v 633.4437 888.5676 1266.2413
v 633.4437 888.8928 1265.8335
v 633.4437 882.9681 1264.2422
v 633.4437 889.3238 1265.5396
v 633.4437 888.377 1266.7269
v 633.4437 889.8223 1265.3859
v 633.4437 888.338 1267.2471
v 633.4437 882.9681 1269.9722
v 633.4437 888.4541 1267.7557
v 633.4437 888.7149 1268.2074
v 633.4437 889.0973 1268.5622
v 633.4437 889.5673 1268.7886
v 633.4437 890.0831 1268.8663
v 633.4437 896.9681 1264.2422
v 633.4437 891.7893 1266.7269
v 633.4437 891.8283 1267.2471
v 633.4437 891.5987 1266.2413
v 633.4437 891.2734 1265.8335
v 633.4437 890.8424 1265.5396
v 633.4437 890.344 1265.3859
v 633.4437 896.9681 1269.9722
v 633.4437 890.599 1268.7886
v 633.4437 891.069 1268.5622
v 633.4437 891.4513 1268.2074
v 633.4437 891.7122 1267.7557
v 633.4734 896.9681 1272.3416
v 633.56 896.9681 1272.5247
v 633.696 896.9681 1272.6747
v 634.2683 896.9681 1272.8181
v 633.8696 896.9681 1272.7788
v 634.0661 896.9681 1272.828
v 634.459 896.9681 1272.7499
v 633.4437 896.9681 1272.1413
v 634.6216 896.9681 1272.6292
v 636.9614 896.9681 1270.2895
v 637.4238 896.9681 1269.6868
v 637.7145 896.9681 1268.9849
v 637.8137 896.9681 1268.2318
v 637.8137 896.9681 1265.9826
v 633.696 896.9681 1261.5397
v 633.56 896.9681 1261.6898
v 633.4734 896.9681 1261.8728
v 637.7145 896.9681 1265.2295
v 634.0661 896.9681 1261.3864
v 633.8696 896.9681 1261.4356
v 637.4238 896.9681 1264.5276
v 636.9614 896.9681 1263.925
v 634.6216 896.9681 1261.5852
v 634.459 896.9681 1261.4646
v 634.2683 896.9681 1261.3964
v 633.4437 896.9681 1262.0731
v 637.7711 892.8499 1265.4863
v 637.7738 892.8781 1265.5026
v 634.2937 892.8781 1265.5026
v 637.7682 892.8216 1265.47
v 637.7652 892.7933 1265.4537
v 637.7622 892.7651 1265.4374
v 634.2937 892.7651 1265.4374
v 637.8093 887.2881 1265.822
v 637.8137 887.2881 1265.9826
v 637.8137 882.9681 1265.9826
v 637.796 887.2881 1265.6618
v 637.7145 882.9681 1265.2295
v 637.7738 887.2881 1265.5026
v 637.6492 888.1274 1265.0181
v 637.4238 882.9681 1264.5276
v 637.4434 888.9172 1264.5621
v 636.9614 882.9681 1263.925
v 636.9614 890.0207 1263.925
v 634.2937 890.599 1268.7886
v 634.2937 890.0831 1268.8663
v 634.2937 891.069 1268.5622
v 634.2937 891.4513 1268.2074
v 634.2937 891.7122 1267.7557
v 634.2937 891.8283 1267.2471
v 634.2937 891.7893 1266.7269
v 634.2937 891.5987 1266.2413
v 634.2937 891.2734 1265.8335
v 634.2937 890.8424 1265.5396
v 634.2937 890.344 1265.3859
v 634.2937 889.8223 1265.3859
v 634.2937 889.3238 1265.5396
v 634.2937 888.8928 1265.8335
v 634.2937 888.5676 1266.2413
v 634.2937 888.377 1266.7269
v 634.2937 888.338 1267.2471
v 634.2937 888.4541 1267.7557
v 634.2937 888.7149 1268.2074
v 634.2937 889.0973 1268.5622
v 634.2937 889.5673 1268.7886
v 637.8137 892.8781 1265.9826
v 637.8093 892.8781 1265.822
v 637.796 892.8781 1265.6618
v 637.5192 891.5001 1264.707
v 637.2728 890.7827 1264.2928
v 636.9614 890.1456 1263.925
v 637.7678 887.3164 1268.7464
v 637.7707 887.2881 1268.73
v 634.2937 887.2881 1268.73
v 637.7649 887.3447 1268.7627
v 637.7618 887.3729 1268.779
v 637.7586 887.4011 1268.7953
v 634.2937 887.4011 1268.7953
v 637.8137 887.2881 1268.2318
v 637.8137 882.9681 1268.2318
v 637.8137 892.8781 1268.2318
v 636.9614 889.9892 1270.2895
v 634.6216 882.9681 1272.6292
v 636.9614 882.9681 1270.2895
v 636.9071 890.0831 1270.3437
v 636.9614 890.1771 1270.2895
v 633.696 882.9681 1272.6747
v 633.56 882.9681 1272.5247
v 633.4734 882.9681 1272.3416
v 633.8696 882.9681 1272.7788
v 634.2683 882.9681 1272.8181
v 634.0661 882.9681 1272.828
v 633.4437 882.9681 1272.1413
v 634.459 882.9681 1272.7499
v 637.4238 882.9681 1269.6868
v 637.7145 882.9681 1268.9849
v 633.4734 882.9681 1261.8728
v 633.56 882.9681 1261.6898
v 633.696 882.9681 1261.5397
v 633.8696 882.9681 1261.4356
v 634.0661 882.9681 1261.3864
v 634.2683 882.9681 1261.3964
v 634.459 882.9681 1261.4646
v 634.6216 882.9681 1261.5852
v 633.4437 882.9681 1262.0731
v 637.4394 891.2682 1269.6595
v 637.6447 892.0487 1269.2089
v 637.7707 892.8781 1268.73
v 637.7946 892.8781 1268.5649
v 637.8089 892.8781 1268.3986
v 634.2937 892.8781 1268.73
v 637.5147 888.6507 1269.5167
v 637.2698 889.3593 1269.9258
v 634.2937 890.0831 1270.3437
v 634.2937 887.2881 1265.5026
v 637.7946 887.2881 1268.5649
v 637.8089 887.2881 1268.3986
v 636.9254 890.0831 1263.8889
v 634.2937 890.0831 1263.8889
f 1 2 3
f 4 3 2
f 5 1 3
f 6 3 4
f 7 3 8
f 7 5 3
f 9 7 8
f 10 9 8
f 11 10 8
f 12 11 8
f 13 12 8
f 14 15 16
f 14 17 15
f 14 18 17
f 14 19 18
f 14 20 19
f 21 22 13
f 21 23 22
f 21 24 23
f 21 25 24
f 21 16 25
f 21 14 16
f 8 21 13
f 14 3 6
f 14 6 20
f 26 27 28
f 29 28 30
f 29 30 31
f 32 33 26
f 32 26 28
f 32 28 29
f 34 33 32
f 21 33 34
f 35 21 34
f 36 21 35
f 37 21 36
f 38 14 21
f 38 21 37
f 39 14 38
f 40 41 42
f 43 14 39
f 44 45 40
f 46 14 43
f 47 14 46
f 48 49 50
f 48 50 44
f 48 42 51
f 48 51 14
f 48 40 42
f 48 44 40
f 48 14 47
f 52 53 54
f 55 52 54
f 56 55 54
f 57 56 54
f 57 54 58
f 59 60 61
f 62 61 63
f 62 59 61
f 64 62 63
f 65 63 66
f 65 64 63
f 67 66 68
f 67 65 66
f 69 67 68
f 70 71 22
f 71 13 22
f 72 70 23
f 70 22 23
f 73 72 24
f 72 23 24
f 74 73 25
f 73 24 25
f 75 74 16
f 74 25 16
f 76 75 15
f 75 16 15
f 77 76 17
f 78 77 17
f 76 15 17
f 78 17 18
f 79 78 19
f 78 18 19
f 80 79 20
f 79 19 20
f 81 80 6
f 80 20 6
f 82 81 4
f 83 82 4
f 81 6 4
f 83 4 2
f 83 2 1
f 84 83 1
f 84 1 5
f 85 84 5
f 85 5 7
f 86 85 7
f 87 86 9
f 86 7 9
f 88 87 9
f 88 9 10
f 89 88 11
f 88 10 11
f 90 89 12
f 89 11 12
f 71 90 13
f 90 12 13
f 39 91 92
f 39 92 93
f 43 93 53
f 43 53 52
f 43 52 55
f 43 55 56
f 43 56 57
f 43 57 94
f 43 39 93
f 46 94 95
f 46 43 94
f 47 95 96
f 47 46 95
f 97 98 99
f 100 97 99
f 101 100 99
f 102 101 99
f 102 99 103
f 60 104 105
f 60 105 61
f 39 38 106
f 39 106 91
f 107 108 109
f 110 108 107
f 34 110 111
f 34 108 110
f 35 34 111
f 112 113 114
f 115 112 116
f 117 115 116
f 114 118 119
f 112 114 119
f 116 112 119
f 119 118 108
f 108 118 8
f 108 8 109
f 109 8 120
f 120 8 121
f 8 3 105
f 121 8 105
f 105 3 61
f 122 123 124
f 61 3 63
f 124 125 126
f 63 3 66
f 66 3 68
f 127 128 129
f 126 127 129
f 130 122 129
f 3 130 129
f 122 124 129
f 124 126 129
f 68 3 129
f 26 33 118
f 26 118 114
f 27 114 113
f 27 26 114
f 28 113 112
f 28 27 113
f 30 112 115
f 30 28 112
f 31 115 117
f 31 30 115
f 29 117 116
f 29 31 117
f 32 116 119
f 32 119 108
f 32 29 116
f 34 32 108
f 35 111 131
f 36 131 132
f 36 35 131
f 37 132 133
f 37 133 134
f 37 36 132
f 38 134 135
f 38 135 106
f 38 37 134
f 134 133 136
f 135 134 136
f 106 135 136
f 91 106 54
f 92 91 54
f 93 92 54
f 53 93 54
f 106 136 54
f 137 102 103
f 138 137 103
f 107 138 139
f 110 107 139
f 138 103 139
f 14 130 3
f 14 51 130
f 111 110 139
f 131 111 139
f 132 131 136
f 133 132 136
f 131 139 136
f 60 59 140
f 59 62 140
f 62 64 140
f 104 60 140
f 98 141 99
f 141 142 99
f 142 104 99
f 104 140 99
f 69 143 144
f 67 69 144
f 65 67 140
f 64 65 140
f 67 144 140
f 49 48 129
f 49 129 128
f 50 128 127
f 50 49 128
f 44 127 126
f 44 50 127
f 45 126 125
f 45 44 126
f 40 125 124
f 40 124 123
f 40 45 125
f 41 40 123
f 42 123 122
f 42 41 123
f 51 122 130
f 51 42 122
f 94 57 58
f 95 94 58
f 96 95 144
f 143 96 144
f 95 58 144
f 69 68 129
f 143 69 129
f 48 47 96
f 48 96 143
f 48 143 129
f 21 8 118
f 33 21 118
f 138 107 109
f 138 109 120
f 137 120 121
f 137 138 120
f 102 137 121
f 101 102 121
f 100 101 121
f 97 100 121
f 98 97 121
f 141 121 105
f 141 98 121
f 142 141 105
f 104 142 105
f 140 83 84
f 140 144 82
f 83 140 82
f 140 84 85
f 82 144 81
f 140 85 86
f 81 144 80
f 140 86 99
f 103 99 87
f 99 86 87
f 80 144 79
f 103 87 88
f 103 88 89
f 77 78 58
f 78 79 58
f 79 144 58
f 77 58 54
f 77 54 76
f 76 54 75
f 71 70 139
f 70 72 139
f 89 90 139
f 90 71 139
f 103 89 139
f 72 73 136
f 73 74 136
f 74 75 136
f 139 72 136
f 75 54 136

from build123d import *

# Parameters (mm, degrees)
BOSS_EXTRUDE1_START = 2.6
BOSS_EXTRUDE1_DEPTH = 7
CUT_EXTRUDE1_START  = -0.8
CUT_EXTRUDE1_DEPTH  = 10
SKETCH3_R           = 1.75
CUT_EXTRUDE2_DEPTH  = 5


with BuildPart() as part:
    # Sketch1 → Boss-Extrude1 (new, symmetric)
    with BuildSketch(Plane(origin=(0, 887.368143731, 0), x_dir=(1, 0, 0), z_dir=(0, 1, 0)).offset(BOSS_EXTRUDE1_START)):
        with BuildLine():
            Line((633.443700104, -1269.972215541), (633.443700891, -1272.141337124))
            ThreePointArc((633.443700891, -1272.141337124), (633.869649439, -1272.778813799), (634.62160457, -1272.629240553))
            Line((634.62160457, -1272.629240553), (636.9613816, -1270.289463523))
            ThreePointArc((636.9613816, -1270.289463523), (637.592190307, -1269.345391575), (637.813700867, -1268.231782784))
            Line((637.813700867, -1268.231782784), (637.813700862, -1265.982648565))
            ThreePointArc((637.813700862, -1265.982648565), (637.5921903, -1264.86903978), (636.961381595, -1263.924967838))
            Line((636.961381595, -1263.924967838), (634.621604564, -1261.585190807))
            ThreePointArc((634.621604564, -1261.585190807), (633.869649432, -1261.435617561), (633.443700885, -1262.073094238))
            Line((633.443700885, -1262.073094238), (633.443700104, -1264.242215823))
            Line((633.443700104, -1264.242215823), (633.443700104, -1269.972215541))
        make_face()
    extrude(amount=BOSS_EXTRUDE1_DEPTH, both=True)

    # Sketch2 → Cut-Extrude1 (cut)
    with BuildSketch(Plane.ZY.offset(-633.493700104).offset(CUT_EXTRUDE1_START)):
        Polygon((1268.73001891, 887.288143731), (1268.795260282, 887.4011451), (1270.343712913, 890.083143731), (1268.73001891, 892.878143731), (1265.502630906, 892.878143731), (1265.437389534, 892.765142361), (1263.888936903, 890.083143731), (1265.502630906, 887.288143731), align=None)
    extrude(amount=-CUT_EXTRUDE1_DEPTH, mode=Mode.SUBTRACT)

    # Sketch3 → Cut-Extrude2 (cut, symmetric)
    with BuildSketch(Plane.ZY.offset(-633.493700104)):
        with Locations((1267.116324916, 890.083143731)):
            Circle(SKETCH3_R)
    extrude(amount=CUT_EXTRUDE2_DEPTH, both=True, mode=Mode.SUBTRACT)


solid = part.part
